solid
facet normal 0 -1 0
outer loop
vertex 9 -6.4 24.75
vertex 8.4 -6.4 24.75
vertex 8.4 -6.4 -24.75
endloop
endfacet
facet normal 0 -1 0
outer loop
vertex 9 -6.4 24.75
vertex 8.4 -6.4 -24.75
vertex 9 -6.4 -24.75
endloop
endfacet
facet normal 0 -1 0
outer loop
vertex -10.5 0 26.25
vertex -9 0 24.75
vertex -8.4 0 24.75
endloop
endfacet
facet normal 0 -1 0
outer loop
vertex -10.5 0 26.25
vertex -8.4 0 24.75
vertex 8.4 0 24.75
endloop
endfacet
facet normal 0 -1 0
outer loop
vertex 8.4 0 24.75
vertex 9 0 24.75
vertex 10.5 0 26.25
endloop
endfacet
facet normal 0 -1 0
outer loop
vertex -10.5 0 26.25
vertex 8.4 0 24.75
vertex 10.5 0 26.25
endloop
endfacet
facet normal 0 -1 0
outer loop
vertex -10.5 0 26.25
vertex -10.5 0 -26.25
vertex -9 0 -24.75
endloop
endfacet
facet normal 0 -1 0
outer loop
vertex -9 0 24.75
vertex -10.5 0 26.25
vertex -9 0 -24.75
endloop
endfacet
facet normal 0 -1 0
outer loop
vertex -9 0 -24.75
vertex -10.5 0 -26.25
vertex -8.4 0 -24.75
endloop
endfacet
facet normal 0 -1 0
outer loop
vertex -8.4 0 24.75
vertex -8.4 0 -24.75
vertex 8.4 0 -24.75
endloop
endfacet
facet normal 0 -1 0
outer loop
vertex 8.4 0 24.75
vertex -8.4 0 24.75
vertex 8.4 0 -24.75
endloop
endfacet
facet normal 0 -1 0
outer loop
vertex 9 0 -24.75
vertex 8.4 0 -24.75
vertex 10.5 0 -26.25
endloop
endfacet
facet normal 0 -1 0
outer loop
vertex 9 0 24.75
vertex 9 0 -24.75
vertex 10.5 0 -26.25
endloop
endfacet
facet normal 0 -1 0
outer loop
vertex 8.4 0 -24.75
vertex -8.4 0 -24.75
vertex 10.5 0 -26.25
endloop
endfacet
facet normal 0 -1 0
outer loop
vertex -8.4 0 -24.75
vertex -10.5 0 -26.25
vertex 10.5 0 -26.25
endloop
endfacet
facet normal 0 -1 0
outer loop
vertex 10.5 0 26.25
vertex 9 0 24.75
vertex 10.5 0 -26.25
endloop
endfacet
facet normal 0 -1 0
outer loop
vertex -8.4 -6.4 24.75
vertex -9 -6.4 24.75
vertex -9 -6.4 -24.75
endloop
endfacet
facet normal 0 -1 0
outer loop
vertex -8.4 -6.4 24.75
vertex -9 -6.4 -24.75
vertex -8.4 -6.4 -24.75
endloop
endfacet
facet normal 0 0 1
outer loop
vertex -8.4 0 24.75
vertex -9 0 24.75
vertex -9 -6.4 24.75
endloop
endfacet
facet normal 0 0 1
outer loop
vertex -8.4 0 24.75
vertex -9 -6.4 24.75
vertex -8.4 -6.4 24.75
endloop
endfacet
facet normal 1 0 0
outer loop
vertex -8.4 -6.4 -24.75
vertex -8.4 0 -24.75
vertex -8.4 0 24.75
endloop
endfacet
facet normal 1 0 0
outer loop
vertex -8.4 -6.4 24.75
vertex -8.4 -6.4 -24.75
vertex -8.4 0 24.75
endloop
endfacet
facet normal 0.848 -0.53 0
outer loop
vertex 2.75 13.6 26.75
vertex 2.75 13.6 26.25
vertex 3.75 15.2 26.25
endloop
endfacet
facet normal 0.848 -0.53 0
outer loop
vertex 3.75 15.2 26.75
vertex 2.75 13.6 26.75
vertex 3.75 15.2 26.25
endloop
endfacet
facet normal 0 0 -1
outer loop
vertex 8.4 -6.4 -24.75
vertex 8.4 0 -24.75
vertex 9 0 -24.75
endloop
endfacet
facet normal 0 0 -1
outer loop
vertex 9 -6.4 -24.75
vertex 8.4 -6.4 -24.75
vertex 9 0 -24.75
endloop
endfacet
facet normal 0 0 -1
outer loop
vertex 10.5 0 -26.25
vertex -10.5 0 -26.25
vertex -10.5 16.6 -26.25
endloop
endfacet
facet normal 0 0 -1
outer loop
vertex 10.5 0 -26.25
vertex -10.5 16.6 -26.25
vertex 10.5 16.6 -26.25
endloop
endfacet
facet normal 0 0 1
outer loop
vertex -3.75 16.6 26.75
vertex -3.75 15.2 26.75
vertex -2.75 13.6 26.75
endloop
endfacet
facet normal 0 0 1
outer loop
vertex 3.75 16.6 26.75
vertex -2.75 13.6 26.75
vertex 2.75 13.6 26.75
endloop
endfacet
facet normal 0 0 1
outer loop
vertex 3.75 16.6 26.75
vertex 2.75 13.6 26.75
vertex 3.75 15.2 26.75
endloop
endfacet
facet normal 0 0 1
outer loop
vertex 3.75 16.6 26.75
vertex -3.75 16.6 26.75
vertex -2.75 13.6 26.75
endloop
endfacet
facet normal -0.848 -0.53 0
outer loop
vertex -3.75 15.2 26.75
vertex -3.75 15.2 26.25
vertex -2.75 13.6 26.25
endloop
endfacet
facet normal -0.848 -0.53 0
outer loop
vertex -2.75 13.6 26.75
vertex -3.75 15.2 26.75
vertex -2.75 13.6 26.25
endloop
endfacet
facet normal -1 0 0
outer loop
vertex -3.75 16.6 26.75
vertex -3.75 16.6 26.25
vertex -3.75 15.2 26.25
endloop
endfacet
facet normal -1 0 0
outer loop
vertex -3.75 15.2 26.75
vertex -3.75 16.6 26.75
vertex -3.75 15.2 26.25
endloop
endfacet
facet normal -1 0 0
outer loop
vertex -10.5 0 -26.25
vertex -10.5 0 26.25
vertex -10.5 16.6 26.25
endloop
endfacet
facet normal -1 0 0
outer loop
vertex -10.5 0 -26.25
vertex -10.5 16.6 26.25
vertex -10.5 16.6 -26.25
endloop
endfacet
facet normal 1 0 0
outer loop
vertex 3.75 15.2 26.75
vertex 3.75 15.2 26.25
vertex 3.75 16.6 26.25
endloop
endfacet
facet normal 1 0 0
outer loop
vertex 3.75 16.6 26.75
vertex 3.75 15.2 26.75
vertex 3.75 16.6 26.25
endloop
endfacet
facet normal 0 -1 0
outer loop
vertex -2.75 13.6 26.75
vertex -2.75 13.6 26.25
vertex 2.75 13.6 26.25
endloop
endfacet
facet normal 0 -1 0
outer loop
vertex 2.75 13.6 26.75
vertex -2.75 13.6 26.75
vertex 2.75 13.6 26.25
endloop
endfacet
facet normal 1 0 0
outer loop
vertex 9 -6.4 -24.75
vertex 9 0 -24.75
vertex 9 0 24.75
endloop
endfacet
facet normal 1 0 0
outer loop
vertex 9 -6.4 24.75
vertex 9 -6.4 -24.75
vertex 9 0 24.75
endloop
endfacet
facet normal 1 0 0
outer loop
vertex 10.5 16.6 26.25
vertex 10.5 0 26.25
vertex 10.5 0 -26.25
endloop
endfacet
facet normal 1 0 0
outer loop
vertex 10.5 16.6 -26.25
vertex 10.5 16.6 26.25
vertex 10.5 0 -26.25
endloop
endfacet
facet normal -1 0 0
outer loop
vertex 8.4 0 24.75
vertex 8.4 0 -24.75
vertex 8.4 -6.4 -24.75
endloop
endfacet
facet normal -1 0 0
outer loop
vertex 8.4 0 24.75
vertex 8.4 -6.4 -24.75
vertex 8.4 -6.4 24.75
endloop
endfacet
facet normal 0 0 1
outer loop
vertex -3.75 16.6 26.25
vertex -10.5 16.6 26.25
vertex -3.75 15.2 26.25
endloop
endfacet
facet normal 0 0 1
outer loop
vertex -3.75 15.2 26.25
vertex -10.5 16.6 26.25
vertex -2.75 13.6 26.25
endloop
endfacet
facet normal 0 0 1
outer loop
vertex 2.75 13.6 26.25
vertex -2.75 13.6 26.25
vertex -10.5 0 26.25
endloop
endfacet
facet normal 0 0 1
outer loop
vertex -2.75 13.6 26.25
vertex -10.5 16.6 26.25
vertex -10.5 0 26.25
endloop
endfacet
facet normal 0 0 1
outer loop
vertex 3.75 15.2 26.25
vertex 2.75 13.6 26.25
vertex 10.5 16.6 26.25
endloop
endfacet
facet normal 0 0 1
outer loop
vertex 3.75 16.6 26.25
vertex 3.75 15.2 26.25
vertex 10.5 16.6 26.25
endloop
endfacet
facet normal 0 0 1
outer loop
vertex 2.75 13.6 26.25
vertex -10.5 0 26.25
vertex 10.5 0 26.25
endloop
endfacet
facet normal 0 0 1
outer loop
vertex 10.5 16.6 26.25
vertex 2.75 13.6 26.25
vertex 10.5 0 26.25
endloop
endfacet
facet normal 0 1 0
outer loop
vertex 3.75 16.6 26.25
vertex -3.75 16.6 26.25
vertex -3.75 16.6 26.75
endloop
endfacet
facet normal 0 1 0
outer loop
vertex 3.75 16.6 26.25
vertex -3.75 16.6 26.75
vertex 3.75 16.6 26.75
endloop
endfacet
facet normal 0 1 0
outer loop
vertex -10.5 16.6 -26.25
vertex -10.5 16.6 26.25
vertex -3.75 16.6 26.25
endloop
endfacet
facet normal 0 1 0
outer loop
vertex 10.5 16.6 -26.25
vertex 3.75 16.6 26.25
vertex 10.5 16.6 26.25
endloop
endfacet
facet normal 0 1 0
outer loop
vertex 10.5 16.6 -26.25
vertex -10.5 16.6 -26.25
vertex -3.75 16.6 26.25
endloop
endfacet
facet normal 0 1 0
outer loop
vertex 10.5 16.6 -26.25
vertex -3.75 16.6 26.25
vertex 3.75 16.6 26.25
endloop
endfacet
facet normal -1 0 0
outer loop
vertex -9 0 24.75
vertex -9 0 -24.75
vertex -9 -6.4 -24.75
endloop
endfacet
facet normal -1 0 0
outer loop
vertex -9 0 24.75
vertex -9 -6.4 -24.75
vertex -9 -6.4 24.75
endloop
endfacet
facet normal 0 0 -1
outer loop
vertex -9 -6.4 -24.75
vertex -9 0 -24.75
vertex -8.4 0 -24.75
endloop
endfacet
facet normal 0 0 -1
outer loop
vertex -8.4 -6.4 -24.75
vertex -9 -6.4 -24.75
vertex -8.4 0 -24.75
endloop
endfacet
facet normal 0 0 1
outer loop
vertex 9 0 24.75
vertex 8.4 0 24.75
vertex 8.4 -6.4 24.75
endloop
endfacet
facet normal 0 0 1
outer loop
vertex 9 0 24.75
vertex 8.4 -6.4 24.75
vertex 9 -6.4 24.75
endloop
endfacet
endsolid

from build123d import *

# Parameters (mm, degrees)
SKETCH1_W           = 21
SKETCH1_H           = 52.5
BOSS_EXTRUDE1_DEPTH = 16.6
BOSS_EXTRUDE2_DEPTH = 0.5
SKETCH3_W           = 0.6
SKETCH3_H           = 49.5
BOSS_EXTRUDE3_DEPTH = 6.4


with BuildPart() as part:
    # Sketch1 → Boss-Extrude1 (new body)
    with BuildSketch(Plane(origin=(0, 0, 0), x_dir=(1, 0, 0), z_dir=(0, 1, 0))):
        Rectangle(SKETCH1_W, SKETCH1_H)
    extrude(amount=BOSS_EXTRUDE1_DEPTH)

    # Sketch2 → Boss-Extrude2 (add)
    with BuildSketch(Plane.XY.offset(26.25)):
        Polygon((-3.75, 16.6), (-3.75, 15.2), (-2.75, 13.6), (2.75, 13.6), (3.75, 15.2), (3.75, 16.6), align=None)
    extrude(amount=BOSS_EXTRUDE2_DEPTH)

    # Sketch3 → Boss-Extrude3 (add)
    with BuildSketch(Plane.XZ):
        with Locations((-8.7, 0)):
            Rectangle(SKETCH3_W, SKETCH3_H)
        with Locations((8.7, 0)):
            Rectangle(SKETCH3_W, SKETCH3_H)
    extrude(amount=BOSS_EXTRUDE3_DEPTH)


solid = part.part
